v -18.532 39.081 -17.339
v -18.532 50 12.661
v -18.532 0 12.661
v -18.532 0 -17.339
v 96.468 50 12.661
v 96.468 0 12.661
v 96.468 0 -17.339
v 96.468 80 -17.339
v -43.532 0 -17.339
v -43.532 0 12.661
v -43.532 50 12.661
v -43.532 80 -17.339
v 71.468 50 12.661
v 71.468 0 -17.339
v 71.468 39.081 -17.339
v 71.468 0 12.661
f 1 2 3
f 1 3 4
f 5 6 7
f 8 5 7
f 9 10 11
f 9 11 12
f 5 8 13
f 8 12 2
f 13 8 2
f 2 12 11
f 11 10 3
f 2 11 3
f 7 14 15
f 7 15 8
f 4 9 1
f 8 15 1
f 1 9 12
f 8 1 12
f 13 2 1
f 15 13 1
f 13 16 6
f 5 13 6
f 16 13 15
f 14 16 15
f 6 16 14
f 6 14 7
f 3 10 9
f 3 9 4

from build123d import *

# Parameters (mm, degrees)
SKETCH1_W             = 25
SKETCH1_H             = 30
BOSS_EXTRUDE1_DEPTH   = 50
BOSS_EXTRUDE1_2_DEPTH = 50
BOSS_EXTRUDE2_START   = -140
BOSS_EXTRUDE2_DEPTH   = 140
BOSS_EXTRUDE3_DEPTH   = 90


with BuildPart() as part:
    # Sketch1 → Boss-Extrude1 (new body)
    with BuildSketch(Plane(origin=(0, 0, 0), x_dir=(1, 0, 0), z_dir=(0, 1, 0))):
        with Locations((-31.032110092, 2.339449541)):
            Rectangle(SKETCH1_W, SKETCH1_H)
    extrude(amount=BOSS_EXTRUDE1_DEPTH)



with BuildPart() as body_2:
    # Sketch1 → Boss-Extrude1 2 (new body)
    with BuildSketch(Plane(origin=(0, 0, 0), x_dir=(1, 0, 0), z_dir=(0, 1, 0))):
        with Locations((83.967889908, 2.339449541)):
            Rectangle(SKETCH1_W, SKETCH1_H)
    extrude(amount=BOSS_EXTRUDE1_2_DEPTH)


with BuildPart() as part_1:
    add(part.part)

    add(body_2.part)  # Boss-Extrude2 merges body 2
    # Sketch2 → Boss-Extrude2 (add)
    with BuildSketch(Plane(origin=(96.467889908, 0, 0), x_dir=(0, 0, -1), z_dir=(1, 0, 0)).offset(BOSS_EXTRUDE2_START)):
        Polygon((-12.660550459, 50), (17.339449541, 50), (17.339449541, 80), align=None)
    extrude(amount=BOSS_EXTRUDE2_DEPTH)

    # Sketch3 → Boss-Extrude3 (add)
    with BuildSketch(Plane(origin=(-18.532110092, 0, 0), x_dir=(0, 0, -1), z_dir=(1, 0, 0))):
        Polygon((-12.660550459, 50), (17.339449541, 39.080892972), (17.339449541, 50), align=None)
    extrude(amount=BOSS_EXTRUDE3_DEPTH)


solid = part_1.part
